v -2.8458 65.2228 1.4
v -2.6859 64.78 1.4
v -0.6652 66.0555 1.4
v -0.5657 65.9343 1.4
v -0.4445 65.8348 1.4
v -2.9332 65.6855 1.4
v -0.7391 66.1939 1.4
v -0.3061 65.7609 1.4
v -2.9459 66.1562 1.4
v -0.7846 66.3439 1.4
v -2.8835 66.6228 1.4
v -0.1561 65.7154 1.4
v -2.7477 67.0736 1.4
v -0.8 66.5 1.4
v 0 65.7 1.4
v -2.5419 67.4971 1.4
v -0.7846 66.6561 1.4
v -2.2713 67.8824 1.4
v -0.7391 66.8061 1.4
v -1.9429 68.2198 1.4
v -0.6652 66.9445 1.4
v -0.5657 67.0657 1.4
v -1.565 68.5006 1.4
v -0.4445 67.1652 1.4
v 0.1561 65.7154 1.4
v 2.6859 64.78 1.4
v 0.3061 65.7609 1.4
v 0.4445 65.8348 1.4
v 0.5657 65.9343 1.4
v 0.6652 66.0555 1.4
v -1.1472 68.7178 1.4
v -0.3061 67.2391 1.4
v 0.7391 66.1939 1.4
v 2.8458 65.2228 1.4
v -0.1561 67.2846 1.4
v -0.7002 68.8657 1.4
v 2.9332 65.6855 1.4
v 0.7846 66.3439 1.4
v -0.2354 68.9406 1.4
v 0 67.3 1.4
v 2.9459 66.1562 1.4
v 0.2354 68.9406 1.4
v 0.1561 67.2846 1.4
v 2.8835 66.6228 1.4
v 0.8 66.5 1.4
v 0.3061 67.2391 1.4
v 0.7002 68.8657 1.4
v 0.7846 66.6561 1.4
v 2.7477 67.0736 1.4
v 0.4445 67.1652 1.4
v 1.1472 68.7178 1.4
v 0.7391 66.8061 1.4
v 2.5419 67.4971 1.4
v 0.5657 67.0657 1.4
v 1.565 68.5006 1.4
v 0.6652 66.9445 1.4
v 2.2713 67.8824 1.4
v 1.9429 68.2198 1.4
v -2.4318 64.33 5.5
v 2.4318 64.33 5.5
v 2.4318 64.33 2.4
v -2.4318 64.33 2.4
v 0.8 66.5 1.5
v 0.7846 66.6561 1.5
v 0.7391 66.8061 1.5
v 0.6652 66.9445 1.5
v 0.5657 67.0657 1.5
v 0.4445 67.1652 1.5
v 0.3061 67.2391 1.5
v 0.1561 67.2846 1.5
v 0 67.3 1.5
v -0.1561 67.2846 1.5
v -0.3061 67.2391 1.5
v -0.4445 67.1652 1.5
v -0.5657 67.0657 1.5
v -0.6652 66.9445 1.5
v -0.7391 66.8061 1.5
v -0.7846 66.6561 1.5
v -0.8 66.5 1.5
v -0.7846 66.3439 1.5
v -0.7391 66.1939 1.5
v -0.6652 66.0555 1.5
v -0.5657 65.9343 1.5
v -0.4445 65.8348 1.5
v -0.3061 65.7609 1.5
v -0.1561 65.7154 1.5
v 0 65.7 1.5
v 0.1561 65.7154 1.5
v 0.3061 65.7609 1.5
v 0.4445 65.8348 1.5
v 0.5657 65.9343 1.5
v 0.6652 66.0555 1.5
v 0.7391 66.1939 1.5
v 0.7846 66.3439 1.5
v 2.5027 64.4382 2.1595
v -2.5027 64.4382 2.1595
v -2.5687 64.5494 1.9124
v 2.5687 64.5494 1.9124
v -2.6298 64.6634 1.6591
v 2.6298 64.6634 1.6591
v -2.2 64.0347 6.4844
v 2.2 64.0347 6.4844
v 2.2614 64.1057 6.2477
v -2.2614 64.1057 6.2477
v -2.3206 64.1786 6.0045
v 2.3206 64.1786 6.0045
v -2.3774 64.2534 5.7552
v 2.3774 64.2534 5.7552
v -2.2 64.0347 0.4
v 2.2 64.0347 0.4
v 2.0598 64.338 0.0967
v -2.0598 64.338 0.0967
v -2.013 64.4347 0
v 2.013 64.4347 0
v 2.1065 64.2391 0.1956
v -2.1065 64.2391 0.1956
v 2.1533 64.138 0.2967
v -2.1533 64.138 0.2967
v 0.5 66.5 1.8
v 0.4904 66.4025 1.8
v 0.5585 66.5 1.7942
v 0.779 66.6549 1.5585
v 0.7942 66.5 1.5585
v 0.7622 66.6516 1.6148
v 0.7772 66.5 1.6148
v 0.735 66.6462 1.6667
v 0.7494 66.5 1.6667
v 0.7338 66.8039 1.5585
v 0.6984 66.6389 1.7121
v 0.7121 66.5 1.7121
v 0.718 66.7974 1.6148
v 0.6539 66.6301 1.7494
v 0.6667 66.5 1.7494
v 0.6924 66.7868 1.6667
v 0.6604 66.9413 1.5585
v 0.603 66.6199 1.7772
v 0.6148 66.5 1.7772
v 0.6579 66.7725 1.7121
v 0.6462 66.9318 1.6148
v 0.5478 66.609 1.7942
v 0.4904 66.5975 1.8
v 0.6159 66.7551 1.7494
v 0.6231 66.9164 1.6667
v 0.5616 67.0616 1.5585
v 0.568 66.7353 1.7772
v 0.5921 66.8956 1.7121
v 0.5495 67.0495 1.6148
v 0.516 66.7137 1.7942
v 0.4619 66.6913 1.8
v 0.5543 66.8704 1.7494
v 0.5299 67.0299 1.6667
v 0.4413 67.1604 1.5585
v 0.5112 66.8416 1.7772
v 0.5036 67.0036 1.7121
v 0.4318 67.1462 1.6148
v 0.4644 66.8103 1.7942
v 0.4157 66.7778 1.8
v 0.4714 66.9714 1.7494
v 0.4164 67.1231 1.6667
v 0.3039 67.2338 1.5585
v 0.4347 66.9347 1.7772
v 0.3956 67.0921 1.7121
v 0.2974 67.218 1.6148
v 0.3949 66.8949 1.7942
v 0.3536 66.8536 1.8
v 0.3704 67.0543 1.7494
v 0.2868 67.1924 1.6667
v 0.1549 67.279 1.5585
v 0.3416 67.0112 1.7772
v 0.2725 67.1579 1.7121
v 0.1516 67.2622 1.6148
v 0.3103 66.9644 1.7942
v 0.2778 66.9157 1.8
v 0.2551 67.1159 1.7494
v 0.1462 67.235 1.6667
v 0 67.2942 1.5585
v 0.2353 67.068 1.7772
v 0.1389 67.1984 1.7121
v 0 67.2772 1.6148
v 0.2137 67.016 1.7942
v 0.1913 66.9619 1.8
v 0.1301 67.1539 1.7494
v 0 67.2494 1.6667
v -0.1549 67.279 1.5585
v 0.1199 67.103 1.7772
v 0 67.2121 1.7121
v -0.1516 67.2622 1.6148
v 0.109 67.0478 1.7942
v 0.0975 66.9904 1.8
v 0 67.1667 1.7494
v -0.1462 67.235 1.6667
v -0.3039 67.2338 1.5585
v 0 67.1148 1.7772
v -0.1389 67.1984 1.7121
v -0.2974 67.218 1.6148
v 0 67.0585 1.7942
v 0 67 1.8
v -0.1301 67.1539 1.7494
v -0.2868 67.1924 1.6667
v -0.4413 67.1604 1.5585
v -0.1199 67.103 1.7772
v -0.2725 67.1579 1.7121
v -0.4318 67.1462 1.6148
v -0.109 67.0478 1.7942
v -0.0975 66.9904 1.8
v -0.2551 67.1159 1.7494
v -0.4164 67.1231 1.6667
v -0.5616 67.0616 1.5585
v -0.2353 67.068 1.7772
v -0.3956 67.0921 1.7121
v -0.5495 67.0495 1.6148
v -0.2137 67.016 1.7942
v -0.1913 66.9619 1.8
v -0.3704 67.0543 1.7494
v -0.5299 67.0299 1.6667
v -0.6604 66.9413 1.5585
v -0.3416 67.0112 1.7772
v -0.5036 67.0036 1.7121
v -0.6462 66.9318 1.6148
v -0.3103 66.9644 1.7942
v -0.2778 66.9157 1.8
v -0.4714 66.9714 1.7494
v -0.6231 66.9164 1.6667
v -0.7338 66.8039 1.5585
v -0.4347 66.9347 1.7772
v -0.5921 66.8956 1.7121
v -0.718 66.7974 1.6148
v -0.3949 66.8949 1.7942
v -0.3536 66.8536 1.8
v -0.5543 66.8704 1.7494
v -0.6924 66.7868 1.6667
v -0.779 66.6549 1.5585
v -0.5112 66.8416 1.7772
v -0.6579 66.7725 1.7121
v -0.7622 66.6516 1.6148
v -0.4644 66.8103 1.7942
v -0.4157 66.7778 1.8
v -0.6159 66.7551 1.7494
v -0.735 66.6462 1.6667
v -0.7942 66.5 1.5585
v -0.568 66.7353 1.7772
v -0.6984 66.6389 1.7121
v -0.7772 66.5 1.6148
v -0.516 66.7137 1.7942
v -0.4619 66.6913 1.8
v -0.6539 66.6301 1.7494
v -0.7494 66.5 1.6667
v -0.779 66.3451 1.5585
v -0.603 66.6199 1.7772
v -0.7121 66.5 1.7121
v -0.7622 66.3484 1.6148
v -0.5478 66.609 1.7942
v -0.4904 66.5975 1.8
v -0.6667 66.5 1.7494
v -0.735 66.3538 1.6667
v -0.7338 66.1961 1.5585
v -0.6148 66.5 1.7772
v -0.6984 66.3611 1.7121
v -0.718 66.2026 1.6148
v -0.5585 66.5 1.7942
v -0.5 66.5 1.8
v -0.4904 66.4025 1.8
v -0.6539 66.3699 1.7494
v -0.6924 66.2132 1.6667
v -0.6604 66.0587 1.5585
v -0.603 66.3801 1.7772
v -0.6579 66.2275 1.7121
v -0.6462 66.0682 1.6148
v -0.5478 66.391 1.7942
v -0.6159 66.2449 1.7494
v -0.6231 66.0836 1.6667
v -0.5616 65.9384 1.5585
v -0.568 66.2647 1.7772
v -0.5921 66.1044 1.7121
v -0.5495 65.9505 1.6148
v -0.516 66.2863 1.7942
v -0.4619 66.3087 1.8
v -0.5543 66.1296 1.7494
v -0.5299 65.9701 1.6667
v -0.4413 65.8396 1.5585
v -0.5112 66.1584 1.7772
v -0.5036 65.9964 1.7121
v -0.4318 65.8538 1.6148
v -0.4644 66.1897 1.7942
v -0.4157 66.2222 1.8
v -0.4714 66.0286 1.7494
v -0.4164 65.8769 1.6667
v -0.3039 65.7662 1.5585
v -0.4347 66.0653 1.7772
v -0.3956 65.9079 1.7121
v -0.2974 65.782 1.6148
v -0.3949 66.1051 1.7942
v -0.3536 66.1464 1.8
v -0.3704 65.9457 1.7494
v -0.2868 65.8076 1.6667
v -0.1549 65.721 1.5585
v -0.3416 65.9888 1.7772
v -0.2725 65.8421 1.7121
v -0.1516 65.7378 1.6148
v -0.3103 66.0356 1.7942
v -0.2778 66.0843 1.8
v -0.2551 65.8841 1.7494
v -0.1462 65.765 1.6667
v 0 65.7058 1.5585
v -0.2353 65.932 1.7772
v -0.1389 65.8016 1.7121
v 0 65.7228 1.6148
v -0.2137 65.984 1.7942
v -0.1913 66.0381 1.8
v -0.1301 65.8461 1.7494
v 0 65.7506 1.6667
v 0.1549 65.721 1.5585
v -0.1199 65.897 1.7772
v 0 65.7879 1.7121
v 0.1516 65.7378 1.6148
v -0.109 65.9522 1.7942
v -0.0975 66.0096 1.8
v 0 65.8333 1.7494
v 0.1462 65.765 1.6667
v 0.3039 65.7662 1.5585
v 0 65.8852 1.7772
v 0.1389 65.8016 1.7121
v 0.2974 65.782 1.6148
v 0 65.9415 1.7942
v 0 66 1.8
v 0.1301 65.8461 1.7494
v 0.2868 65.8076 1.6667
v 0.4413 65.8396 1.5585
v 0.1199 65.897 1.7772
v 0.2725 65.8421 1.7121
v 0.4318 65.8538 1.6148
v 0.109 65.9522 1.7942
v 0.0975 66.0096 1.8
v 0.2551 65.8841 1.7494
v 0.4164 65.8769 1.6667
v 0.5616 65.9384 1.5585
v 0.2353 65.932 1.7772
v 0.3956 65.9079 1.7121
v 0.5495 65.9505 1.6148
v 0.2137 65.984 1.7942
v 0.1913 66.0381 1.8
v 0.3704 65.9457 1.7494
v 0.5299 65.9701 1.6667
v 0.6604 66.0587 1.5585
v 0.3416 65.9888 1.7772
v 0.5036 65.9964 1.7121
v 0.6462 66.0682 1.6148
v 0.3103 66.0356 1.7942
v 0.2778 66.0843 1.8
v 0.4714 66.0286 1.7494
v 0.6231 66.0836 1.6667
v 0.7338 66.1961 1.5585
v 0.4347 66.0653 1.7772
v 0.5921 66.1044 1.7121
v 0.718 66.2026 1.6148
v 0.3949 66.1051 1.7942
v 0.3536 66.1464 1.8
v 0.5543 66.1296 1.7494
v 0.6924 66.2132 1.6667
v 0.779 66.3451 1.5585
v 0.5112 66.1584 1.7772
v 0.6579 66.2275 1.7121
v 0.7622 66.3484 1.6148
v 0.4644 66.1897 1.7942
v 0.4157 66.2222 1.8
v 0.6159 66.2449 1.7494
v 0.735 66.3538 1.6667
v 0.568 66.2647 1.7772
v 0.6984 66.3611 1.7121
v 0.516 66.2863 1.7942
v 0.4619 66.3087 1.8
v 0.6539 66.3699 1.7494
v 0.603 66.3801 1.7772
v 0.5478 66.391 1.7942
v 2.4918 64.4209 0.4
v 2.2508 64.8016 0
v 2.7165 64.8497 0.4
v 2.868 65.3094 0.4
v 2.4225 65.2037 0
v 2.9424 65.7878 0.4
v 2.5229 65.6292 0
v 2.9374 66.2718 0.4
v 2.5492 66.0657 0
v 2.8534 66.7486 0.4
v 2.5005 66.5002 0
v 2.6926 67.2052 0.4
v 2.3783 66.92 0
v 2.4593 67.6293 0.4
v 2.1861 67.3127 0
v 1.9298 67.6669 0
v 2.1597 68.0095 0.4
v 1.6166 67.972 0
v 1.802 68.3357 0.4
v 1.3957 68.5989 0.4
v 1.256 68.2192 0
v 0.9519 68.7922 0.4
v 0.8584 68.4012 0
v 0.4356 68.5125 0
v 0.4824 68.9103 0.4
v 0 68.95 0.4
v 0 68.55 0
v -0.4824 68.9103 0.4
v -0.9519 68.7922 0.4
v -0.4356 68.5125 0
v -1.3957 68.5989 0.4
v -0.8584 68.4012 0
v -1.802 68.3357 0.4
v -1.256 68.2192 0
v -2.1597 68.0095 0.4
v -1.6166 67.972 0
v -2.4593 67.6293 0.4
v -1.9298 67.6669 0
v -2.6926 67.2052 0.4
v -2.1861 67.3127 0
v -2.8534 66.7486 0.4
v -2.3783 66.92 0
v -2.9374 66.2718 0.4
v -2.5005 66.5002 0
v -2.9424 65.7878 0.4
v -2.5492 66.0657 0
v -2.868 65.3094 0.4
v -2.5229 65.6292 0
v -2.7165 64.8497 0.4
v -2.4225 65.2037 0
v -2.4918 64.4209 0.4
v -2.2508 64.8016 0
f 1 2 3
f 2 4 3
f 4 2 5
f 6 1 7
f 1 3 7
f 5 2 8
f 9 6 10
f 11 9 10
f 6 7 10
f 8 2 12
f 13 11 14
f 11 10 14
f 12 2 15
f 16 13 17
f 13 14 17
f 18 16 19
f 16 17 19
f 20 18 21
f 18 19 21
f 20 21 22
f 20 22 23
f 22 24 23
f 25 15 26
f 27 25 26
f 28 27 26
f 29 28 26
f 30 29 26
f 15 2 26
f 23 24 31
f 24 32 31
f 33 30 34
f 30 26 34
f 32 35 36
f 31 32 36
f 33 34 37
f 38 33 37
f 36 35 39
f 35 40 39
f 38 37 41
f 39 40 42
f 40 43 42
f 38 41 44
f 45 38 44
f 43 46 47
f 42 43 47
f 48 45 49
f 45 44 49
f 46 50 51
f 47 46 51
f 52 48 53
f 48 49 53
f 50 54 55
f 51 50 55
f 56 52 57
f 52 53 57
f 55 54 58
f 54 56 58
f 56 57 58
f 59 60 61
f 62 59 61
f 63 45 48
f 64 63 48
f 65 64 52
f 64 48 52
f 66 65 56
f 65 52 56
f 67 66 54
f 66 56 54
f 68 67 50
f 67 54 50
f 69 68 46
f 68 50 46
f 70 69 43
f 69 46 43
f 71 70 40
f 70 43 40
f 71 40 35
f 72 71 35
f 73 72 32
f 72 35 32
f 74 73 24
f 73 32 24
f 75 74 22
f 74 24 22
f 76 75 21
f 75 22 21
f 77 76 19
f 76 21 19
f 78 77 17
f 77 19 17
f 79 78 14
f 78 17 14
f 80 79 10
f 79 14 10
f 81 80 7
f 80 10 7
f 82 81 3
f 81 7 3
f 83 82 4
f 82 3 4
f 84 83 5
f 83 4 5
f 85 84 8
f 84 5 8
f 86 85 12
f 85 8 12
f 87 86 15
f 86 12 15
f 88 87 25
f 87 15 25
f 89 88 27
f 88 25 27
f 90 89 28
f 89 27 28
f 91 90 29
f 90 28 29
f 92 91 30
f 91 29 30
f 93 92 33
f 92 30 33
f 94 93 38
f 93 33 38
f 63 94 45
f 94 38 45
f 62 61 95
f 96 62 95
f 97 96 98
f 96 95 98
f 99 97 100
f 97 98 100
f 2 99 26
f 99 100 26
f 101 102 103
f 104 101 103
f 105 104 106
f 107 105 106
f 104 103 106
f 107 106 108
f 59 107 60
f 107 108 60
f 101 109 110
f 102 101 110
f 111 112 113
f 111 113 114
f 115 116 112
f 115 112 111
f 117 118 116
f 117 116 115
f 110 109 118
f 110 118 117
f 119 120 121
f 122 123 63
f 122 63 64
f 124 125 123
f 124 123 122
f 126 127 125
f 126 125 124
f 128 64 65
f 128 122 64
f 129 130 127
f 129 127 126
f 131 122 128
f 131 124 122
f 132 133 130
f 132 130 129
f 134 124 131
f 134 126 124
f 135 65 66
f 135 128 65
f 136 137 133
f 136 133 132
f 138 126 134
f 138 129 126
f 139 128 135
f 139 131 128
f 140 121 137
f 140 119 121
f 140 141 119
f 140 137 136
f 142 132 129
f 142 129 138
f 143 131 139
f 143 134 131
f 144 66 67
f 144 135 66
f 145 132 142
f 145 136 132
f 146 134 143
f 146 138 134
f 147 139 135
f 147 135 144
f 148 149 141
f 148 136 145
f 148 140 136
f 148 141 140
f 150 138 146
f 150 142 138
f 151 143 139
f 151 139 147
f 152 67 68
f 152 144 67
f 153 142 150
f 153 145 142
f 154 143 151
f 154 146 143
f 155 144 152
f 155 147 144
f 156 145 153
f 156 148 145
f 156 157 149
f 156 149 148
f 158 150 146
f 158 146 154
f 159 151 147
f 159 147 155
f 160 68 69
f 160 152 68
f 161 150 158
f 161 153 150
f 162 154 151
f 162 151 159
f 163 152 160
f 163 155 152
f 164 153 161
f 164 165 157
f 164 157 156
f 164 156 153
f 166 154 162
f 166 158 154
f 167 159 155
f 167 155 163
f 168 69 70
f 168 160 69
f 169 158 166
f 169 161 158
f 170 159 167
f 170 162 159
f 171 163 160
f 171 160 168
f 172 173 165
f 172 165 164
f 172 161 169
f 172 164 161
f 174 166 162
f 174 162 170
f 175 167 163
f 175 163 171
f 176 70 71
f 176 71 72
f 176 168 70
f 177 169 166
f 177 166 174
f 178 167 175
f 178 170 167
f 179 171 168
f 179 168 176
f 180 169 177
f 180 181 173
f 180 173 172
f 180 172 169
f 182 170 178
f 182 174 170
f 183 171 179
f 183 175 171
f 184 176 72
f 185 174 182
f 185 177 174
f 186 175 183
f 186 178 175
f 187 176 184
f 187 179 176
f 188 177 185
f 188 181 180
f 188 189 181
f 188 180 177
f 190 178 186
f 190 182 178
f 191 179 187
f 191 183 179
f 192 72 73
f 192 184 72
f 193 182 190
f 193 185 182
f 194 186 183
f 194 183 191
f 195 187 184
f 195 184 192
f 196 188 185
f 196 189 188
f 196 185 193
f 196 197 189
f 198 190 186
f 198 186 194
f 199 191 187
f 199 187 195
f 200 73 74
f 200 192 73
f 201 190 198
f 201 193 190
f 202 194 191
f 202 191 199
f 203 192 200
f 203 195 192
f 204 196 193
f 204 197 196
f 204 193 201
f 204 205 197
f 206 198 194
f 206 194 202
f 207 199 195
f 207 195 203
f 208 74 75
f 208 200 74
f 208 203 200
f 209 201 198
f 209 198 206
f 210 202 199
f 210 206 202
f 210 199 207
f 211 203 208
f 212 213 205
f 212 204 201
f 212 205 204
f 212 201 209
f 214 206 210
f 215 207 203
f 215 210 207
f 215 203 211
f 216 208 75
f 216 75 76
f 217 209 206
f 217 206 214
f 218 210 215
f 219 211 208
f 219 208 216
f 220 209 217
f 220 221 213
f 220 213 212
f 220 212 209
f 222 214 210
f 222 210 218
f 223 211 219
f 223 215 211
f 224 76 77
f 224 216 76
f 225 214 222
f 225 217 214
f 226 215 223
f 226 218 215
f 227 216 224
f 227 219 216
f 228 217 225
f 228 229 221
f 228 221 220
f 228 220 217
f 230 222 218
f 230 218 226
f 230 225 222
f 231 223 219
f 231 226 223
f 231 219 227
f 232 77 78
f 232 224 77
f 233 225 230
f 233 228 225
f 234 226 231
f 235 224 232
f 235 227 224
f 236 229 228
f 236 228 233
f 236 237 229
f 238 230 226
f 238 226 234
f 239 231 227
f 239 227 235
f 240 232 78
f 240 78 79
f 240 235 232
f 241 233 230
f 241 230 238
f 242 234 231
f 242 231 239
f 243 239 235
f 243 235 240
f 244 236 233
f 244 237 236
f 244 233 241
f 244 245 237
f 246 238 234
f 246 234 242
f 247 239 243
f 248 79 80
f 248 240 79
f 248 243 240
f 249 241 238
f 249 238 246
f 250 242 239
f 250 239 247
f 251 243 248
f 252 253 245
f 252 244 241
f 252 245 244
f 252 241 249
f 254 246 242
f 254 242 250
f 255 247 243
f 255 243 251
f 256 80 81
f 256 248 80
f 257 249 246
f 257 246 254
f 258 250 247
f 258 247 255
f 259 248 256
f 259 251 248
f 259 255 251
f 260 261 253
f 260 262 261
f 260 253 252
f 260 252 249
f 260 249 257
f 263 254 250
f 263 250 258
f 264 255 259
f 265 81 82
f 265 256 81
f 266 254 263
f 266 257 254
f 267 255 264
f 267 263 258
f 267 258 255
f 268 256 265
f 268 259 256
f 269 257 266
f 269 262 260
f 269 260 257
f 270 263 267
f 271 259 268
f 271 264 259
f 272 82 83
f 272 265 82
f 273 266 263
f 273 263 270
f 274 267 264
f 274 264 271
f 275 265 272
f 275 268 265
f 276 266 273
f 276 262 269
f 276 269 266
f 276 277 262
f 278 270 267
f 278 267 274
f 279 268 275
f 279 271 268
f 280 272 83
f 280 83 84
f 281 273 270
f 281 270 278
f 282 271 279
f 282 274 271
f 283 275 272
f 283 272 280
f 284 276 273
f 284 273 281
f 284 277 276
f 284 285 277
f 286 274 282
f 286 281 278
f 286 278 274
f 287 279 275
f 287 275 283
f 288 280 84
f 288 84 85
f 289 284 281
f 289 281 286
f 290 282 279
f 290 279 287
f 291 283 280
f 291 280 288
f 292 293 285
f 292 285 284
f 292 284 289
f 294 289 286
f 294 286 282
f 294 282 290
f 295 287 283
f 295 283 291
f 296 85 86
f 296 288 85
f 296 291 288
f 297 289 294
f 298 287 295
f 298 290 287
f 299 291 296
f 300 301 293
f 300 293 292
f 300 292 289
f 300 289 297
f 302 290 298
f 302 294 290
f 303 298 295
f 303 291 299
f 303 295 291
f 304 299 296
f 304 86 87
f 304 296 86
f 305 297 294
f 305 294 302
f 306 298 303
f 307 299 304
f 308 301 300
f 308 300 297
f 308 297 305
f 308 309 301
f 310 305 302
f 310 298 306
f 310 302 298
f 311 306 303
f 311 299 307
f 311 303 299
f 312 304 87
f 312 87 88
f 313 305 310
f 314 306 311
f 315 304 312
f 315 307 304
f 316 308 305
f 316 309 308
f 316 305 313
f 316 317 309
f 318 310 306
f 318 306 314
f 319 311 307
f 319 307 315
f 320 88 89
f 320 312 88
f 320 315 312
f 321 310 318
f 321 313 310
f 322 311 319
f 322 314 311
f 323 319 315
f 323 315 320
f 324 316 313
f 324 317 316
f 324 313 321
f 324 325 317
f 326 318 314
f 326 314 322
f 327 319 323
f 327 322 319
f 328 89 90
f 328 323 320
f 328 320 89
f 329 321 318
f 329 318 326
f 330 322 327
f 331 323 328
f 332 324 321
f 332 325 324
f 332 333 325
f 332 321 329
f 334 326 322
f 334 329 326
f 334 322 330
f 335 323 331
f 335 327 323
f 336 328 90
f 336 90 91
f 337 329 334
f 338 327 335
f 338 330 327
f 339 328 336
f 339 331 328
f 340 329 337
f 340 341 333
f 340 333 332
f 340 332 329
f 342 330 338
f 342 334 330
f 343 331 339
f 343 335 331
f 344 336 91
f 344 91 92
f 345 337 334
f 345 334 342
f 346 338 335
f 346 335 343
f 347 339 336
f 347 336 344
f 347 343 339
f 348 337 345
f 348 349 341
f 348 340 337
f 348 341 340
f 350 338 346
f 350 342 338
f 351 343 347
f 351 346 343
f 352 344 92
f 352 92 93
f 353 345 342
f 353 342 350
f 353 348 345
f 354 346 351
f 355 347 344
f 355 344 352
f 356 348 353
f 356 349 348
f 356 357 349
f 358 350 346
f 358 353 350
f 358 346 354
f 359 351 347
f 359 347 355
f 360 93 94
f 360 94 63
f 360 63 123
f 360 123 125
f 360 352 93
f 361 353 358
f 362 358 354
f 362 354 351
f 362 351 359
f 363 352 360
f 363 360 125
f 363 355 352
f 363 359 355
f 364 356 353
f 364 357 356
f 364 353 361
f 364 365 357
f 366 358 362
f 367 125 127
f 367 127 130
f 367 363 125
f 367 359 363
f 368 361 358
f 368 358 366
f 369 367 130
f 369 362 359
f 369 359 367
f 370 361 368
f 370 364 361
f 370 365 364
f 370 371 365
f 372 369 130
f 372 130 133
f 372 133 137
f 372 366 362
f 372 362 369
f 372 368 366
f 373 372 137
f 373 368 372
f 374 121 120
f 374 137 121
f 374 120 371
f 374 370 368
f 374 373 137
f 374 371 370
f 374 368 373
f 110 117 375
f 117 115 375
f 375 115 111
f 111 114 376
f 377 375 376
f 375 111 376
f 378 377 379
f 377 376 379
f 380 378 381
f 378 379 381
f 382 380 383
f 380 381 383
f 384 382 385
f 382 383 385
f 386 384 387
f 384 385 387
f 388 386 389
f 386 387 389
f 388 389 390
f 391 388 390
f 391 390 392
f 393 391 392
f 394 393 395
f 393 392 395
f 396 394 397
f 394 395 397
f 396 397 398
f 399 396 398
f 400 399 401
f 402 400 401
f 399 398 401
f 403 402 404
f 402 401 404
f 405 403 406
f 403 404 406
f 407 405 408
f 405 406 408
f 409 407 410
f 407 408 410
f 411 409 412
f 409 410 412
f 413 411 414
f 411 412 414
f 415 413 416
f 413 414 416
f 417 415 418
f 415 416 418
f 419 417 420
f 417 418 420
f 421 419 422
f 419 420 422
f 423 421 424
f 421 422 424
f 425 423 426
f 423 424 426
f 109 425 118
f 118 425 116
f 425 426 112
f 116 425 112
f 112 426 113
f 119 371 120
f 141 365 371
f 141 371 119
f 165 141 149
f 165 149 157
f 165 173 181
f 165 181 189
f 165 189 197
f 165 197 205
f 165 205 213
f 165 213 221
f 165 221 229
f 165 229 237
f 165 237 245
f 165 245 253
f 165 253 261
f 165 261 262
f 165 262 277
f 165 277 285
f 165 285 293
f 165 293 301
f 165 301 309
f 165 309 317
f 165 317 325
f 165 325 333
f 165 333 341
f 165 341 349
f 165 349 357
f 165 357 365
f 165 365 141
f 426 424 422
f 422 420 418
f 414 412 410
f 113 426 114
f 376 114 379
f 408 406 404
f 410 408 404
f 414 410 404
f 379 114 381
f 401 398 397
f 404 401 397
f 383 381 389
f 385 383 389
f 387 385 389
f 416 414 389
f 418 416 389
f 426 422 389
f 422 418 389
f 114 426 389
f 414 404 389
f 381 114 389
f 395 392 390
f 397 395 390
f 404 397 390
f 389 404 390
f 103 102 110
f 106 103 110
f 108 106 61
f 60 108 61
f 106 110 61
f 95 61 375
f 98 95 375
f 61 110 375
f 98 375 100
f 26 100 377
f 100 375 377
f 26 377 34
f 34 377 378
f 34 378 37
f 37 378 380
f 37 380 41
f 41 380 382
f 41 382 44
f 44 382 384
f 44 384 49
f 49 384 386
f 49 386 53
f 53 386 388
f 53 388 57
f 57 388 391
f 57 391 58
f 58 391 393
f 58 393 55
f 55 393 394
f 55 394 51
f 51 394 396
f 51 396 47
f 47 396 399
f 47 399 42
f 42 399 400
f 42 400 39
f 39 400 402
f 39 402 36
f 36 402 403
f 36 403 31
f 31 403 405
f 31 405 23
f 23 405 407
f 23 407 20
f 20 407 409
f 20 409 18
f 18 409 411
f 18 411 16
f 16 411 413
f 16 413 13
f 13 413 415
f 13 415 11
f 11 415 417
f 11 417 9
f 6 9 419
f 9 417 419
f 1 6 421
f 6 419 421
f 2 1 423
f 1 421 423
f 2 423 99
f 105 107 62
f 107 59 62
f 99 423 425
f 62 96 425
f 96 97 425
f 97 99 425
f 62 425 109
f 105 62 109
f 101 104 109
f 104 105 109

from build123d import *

# Parameters (mm, degrees)
PAD008_DEPTH         = 6.5
POCKET007_DEPTH      = 2.951
POCKET007_DEPTH_BACK = 2.951
SKETCH023_R          = 0.8
PAD009_DEPTH         = 0.4
FILLET001_R          = 0.3
CHAMFER007_SIZE      = 0.4


with BuildPart() as part:
    # Sketch022 → Pad008 (new body)
    with BuildSketch(Plane.XY):
        with BuildLine():
            ThreePointArc((2.2, -1.9653244007), (0, 2.95), (-2.2, -1.9653244007))
            Line((-2.2, -1.9653244007), (2.2, -1.9653244007))
        make_face()
    extrude(amount=PAD008_DEPTH)

    # Sketch024 → Pocket007 (cut, two sides)
    with BuildSketch(Plane.YZ) as pocket007_sk:
        Polygon((-1.97, 6.5), (-1.67, 5.5), (-1.67, 2.4), (-1.22, 1.4), (4, 1.4), (4, 6.5), align=None)
    extrude(amount=-POCKET007_DEPTH, mode=Mode.SUBTRACT)
    extrude(pocket007_sk.sketch, amount=POCKET007_DEPTH_BACK, mode=Mode.SUBTRACT)

    # Sketch023 (on Face7 of Pocket007) → Pad009 (join)
    with BuildSketch(Plane.XY.offset(1.4)):
        with Locations((0, 0.5)):
            Circle(SKETCH023_R)
    extrude(amount=PAD009_DEPTH)

    # Fillet001
    fillet001_edges = [part.edges().sort_by_distance(p)[0] for p in [
        (-0.8, 0.5, 1.8),
    ]]
    fillet(fillet001_edges, radius=FILLET001_R)

    # Chamfer007
    chamfer007_edges = [part.edges().sort_by_distance(p)[0] for p in [
        (0, 2.95, 0),
        (0, -1.965324, 0),
    ]]
    chamfer(chamfer007_edges, length=CHAMFER007_SIZE)


with BuildPart() as part_1:
    # Body091 placement: moved
    add(part.part.moved(Location((0, 66, 0))))


solid = part_1.part
